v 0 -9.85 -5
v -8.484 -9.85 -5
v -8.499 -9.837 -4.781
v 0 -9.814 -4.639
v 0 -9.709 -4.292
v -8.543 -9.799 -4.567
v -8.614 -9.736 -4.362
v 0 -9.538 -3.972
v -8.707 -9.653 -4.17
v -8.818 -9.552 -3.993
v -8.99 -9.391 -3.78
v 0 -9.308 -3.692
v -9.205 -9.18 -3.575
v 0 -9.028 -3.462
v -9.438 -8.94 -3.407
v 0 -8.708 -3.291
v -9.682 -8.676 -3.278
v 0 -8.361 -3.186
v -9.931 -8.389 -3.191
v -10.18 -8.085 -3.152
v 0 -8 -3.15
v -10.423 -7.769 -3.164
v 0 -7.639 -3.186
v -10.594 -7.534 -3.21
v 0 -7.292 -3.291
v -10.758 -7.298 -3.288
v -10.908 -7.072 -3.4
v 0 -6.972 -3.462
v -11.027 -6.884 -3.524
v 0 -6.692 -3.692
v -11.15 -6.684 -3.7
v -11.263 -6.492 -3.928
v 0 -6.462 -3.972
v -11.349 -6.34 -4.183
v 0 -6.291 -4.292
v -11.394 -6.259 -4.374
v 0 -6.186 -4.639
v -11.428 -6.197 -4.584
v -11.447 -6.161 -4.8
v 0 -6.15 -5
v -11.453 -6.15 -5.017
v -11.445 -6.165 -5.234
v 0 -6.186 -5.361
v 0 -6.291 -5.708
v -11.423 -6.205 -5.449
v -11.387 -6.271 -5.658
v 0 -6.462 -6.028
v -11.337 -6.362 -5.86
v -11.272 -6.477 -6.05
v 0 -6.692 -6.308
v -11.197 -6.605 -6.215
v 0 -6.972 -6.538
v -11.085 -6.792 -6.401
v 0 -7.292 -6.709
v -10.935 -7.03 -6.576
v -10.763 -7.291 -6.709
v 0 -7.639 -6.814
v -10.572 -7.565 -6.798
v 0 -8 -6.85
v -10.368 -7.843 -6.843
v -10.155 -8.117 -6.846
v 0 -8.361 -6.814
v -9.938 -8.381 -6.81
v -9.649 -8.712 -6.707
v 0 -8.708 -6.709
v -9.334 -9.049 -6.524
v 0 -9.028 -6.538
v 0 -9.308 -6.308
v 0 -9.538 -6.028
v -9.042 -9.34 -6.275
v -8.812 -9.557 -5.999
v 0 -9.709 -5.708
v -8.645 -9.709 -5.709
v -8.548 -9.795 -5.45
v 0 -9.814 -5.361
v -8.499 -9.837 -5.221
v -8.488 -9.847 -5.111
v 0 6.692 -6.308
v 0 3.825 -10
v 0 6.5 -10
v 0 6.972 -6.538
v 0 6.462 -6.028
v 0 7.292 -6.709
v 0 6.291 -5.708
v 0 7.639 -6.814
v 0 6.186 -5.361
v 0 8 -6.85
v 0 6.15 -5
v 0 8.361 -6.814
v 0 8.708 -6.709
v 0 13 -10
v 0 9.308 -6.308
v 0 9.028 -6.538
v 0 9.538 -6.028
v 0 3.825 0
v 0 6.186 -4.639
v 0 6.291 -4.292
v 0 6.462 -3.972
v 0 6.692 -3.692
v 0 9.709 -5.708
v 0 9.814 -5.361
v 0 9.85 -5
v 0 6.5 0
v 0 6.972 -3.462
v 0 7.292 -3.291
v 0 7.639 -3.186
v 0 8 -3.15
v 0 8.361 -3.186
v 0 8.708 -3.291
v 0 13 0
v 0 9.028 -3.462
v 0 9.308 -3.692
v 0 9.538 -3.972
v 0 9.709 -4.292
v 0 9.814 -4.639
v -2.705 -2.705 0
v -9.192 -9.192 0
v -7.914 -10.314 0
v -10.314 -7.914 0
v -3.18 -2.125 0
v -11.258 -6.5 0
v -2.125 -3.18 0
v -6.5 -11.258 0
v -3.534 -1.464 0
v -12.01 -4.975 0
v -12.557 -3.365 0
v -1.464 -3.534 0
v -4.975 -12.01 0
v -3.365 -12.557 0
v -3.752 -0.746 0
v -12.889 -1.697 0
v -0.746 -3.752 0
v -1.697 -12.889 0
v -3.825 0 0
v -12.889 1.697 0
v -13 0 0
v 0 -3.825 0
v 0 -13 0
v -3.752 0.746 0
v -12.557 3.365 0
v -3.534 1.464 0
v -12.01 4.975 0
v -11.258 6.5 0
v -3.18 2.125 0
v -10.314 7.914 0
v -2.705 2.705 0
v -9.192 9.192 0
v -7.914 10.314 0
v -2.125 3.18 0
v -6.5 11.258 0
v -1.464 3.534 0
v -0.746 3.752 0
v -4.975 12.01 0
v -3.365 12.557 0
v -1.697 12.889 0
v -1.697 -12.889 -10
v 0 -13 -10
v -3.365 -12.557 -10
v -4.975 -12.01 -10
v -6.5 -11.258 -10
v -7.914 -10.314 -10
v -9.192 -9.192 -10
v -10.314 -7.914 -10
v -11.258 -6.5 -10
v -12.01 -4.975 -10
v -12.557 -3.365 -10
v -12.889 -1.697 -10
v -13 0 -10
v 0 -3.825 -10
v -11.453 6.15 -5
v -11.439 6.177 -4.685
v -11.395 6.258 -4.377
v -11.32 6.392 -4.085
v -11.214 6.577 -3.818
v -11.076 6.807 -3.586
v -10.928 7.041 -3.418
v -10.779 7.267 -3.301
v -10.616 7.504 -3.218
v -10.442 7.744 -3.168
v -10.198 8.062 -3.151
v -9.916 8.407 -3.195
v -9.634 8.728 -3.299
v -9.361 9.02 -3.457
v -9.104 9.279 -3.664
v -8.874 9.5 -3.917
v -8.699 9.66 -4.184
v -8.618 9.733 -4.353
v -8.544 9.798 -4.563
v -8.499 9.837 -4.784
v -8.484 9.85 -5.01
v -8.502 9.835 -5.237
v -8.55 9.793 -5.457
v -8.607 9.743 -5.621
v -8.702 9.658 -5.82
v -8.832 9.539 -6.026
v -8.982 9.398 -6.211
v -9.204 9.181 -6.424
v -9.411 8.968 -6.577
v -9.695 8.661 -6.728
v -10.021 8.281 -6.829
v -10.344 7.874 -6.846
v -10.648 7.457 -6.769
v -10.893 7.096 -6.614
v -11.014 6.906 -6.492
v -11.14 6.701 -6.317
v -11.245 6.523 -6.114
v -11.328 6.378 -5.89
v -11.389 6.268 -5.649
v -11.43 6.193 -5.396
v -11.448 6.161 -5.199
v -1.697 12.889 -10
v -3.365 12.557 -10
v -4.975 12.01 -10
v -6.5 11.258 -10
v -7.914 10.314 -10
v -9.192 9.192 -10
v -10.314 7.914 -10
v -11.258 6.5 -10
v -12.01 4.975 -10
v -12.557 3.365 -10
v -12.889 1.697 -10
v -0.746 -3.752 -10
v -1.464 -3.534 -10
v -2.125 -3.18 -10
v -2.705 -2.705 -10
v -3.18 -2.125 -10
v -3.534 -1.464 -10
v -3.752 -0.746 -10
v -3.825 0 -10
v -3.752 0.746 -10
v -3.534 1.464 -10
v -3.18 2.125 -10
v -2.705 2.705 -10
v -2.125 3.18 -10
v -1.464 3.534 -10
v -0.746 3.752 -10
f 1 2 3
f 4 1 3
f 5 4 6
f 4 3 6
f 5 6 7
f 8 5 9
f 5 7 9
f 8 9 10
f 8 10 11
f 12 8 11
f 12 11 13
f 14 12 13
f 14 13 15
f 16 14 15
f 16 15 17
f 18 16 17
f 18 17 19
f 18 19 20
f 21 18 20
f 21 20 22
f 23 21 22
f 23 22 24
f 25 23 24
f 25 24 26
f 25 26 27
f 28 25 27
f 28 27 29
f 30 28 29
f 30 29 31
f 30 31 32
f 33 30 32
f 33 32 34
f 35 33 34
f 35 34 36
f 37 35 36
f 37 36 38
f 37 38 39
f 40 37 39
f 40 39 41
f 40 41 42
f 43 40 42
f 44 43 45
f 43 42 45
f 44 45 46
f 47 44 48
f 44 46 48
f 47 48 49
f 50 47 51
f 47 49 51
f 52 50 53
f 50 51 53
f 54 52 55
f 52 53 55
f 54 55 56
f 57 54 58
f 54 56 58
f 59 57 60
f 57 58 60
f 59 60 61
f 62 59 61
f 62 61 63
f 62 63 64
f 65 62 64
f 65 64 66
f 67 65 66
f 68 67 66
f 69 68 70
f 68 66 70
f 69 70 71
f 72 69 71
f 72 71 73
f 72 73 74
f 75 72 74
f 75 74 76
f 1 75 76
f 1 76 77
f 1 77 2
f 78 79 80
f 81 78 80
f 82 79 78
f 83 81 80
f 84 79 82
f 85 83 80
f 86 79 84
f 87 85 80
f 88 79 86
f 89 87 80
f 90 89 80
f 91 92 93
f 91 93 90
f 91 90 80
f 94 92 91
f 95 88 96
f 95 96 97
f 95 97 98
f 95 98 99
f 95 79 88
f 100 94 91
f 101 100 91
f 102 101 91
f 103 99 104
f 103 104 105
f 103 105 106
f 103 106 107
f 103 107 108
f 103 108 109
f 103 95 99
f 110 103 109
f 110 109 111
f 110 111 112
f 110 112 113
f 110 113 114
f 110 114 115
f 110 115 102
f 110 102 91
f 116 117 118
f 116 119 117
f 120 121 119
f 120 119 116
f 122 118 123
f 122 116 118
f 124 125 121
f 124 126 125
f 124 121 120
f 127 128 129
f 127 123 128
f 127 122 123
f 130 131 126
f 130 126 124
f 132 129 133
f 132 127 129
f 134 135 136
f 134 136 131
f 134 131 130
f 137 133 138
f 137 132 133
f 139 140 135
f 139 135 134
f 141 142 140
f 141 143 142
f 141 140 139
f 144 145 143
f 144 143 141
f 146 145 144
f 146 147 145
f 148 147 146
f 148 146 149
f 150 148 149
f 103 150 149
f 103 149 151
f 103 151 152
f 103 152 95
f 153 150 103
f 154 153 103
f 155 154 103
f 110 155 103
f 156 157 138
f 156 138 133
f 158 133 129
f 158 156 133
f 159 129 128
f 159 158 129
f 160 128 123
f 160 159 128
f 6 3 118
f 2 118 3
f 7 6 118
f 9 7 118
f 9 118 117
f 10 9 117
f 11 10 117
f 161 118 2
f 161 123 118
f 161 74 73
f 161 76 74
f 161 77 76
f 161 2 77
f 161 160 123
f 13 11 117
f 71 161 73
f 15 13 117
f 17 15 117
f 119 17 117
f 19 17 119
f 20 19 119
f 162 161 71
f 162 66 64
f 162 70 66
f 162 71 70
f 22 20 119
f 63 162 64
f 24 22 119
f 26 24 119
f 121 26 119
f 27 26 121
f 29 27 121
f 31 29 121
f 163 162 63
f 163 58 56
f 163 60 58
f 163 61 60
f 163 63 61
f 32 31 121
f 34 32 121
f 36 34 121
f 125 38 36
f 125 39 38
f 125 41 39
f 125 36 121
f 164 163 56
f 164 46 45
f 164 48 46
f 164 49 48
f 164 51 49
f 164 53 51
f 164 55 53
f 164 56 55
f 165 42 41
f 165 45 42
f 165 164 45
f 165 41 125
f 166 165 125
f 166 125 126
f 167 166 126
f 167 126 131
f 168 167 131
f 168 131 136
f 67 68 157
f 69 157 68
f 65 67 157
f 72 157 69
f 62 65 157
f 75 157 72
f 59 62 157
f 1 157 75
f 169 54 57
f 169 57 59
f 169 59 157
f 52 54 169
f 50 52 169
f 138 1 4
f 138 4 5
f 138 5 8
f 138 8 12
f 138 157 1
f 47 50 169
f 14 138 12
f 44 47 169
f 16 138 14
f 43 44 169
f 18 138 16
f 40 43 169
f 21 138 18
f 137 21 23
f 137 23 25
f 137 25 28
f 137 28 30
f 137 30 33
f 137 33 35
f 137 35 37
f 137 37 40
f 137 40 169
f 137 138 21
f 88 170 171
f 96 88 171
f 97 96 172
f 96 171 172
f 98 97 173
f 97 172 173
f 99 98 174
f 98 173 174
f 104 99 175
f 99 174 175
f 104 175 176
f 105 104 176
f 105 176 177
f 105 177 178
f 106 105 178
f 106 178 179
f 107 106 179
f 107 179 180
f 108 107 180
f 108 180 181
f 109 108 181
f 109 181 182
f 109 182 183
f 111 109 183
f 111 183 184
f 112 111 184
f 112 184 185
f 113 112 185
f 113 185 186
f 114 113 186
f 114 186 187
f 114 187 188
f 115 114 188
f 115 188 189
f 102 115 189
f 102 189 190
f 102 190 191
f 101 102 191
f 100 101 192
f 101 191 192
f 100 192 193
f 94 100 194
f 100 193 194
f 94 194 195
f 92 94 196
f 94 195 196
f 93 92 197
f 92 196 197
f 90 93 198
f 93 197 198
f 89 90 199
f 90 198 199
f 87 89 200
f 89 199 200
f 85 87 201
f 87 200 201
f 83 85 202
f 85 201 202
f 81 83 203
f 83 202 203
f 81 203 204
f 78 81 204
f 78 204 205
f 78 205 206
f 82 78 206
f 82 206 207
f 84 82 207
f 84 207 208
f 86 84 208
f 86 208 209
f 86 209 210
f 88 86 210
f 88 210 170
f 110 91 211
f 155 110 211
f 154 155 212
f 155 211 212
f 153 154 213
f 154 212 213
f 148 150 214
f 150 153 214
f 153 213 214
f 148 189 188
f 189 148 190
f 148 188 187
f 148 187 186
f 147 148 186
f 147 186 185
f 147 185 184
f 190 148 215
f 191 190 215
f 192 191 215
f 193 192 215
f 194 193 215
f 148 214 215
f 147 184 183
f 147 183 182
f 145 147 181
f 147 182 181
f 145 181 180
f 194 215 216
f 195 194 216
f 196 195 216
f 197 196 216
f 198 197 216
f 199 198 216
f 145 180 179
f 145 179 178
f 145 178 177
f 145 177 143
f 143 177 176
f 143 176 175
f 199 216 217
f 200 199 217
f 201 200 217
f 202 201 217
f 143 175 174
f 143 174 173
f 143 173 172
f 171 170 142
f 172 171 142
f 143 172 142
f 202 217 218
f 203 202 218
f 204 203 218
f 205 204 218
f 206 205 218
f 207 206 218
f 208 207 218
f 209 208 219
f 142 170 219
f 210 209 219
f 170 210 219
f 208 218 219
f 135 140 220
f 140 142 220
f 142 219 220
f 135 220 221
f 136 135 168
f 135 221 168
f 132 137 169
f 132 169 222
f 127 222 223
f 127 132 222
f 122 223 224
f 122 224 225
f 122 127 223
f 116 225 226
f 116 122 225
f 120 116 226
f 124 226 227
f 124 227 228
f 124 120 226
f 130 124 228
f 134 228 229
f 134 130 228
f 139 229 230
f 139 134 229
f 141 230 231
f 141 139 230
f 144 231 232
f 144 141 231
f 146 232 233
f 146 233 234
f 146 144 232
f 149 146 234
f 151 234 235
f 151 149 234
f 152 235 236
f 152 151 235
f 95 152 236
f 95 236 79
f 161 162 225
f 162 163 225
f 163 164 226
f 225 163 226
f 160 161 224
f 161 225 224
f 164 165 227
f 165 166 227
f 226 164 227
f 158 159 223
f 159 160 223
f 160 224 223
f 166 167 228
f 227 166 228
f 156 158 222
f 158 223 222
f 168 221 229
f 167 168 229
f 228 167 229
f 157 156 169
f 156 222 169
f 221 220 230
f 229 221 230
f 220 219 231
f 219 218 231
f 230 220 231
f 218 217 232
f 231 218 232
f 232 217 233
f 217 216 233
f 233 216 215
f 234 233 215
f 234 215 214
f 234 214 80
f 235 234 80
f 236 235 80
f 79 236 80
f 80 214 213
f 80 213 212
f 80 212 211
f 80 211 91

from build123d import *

# Parameters (mm, degrees)
F0_W        = 6.7956063077
F0_H        = 13
F0_H_2      = 6.5
F0_W_2      = 6.2043936923
F1_DEPTH    = 10
F2_R        = 1.85
F3_DEPTH    = 13
F4_T1_DEPTH = 75


# Not quite as in the source:
# - a fillet or chamfer that OpenCascade refuses, or shapes differently, is made with other operations: its cross-section is extruded or revolved along the edge and cut away or added
# - a feature names something its author has since deleted; it is built from what else it names


with BuildPart() as f1:
    # F0 (on Top) → F1 (new body)
    with BuildSketch(Plane.XY):
        with BuildLine():
            Line((0, 6.5), (-6.2043936923, 6.5))
            Line((-6.2043936923, 6.5), (-6.2043936923, -6.5))
            Line((-6.2043936923, -6.5), (0, -6.5))
            Line((0, -6.5), (0, -3.825))
            ThreePointArc((0, -3.825), (-3.825, 0), (0, 3.825))
            Line((0, 3.825), (0, 6.5))
        make_face()
        with Locations((-9.6021968462, 0)):
            Rectangle(F0_W, F0_H)
        with Locations((-9.6021968462, 9.75)):
            Rectangle(F0_W, F0_H_2)
        with Locations((-3.1021968462, 9.75)):
            Rectangle(F0_W_2, F0_H_2)
        Polygon((-6.2043936923, -6.5), (-13, -6.5), (-13, -13), (0, -13), (0, -6.5), align=None)
    extrude(amount=-F1_DEPTH)

    # F2 (on face) → F3 (cut, through all)
    with BuildSketch(Plane(origin=(-13, 0, 0), x_dir=(0, -1, 0), z_dir=(-1, 0, 0))):
        with Locations((-8, -5)):
            Circle(F2_R)
        with Locations((8, -5)):
            Circle(F2_R)
    extrude(amount=-F3_DEPTH, mode=Mode.SUBTRACT)

    # F4: fillet of radius 13 on 2 edges, made by hand

    # F4_s2 → F4_t1 (cut)
    with BuildSketch(Plane.XY.offset(-42.5)):
        with BuildLine():
            ThreePointArc((0, 13), (-9.1923881554, 9.1923881554), (-13, 0))
            Line((-13, 0), (-13, 13))
            Line((-13, 13), (0, 13))
        make_face()
        with BuildLine():
            ThreePointArc((0, -13), (-9.1923881554, -9.1923881554), (-13, 0))
            Line((-13, 0), (-13, -13))
            Line((-13, -13), (0, -13))
        make_face()
    extrude(amount=F4_T1_DEPTH, mode=Mode.SUBTRACT)


solid = f1.part
